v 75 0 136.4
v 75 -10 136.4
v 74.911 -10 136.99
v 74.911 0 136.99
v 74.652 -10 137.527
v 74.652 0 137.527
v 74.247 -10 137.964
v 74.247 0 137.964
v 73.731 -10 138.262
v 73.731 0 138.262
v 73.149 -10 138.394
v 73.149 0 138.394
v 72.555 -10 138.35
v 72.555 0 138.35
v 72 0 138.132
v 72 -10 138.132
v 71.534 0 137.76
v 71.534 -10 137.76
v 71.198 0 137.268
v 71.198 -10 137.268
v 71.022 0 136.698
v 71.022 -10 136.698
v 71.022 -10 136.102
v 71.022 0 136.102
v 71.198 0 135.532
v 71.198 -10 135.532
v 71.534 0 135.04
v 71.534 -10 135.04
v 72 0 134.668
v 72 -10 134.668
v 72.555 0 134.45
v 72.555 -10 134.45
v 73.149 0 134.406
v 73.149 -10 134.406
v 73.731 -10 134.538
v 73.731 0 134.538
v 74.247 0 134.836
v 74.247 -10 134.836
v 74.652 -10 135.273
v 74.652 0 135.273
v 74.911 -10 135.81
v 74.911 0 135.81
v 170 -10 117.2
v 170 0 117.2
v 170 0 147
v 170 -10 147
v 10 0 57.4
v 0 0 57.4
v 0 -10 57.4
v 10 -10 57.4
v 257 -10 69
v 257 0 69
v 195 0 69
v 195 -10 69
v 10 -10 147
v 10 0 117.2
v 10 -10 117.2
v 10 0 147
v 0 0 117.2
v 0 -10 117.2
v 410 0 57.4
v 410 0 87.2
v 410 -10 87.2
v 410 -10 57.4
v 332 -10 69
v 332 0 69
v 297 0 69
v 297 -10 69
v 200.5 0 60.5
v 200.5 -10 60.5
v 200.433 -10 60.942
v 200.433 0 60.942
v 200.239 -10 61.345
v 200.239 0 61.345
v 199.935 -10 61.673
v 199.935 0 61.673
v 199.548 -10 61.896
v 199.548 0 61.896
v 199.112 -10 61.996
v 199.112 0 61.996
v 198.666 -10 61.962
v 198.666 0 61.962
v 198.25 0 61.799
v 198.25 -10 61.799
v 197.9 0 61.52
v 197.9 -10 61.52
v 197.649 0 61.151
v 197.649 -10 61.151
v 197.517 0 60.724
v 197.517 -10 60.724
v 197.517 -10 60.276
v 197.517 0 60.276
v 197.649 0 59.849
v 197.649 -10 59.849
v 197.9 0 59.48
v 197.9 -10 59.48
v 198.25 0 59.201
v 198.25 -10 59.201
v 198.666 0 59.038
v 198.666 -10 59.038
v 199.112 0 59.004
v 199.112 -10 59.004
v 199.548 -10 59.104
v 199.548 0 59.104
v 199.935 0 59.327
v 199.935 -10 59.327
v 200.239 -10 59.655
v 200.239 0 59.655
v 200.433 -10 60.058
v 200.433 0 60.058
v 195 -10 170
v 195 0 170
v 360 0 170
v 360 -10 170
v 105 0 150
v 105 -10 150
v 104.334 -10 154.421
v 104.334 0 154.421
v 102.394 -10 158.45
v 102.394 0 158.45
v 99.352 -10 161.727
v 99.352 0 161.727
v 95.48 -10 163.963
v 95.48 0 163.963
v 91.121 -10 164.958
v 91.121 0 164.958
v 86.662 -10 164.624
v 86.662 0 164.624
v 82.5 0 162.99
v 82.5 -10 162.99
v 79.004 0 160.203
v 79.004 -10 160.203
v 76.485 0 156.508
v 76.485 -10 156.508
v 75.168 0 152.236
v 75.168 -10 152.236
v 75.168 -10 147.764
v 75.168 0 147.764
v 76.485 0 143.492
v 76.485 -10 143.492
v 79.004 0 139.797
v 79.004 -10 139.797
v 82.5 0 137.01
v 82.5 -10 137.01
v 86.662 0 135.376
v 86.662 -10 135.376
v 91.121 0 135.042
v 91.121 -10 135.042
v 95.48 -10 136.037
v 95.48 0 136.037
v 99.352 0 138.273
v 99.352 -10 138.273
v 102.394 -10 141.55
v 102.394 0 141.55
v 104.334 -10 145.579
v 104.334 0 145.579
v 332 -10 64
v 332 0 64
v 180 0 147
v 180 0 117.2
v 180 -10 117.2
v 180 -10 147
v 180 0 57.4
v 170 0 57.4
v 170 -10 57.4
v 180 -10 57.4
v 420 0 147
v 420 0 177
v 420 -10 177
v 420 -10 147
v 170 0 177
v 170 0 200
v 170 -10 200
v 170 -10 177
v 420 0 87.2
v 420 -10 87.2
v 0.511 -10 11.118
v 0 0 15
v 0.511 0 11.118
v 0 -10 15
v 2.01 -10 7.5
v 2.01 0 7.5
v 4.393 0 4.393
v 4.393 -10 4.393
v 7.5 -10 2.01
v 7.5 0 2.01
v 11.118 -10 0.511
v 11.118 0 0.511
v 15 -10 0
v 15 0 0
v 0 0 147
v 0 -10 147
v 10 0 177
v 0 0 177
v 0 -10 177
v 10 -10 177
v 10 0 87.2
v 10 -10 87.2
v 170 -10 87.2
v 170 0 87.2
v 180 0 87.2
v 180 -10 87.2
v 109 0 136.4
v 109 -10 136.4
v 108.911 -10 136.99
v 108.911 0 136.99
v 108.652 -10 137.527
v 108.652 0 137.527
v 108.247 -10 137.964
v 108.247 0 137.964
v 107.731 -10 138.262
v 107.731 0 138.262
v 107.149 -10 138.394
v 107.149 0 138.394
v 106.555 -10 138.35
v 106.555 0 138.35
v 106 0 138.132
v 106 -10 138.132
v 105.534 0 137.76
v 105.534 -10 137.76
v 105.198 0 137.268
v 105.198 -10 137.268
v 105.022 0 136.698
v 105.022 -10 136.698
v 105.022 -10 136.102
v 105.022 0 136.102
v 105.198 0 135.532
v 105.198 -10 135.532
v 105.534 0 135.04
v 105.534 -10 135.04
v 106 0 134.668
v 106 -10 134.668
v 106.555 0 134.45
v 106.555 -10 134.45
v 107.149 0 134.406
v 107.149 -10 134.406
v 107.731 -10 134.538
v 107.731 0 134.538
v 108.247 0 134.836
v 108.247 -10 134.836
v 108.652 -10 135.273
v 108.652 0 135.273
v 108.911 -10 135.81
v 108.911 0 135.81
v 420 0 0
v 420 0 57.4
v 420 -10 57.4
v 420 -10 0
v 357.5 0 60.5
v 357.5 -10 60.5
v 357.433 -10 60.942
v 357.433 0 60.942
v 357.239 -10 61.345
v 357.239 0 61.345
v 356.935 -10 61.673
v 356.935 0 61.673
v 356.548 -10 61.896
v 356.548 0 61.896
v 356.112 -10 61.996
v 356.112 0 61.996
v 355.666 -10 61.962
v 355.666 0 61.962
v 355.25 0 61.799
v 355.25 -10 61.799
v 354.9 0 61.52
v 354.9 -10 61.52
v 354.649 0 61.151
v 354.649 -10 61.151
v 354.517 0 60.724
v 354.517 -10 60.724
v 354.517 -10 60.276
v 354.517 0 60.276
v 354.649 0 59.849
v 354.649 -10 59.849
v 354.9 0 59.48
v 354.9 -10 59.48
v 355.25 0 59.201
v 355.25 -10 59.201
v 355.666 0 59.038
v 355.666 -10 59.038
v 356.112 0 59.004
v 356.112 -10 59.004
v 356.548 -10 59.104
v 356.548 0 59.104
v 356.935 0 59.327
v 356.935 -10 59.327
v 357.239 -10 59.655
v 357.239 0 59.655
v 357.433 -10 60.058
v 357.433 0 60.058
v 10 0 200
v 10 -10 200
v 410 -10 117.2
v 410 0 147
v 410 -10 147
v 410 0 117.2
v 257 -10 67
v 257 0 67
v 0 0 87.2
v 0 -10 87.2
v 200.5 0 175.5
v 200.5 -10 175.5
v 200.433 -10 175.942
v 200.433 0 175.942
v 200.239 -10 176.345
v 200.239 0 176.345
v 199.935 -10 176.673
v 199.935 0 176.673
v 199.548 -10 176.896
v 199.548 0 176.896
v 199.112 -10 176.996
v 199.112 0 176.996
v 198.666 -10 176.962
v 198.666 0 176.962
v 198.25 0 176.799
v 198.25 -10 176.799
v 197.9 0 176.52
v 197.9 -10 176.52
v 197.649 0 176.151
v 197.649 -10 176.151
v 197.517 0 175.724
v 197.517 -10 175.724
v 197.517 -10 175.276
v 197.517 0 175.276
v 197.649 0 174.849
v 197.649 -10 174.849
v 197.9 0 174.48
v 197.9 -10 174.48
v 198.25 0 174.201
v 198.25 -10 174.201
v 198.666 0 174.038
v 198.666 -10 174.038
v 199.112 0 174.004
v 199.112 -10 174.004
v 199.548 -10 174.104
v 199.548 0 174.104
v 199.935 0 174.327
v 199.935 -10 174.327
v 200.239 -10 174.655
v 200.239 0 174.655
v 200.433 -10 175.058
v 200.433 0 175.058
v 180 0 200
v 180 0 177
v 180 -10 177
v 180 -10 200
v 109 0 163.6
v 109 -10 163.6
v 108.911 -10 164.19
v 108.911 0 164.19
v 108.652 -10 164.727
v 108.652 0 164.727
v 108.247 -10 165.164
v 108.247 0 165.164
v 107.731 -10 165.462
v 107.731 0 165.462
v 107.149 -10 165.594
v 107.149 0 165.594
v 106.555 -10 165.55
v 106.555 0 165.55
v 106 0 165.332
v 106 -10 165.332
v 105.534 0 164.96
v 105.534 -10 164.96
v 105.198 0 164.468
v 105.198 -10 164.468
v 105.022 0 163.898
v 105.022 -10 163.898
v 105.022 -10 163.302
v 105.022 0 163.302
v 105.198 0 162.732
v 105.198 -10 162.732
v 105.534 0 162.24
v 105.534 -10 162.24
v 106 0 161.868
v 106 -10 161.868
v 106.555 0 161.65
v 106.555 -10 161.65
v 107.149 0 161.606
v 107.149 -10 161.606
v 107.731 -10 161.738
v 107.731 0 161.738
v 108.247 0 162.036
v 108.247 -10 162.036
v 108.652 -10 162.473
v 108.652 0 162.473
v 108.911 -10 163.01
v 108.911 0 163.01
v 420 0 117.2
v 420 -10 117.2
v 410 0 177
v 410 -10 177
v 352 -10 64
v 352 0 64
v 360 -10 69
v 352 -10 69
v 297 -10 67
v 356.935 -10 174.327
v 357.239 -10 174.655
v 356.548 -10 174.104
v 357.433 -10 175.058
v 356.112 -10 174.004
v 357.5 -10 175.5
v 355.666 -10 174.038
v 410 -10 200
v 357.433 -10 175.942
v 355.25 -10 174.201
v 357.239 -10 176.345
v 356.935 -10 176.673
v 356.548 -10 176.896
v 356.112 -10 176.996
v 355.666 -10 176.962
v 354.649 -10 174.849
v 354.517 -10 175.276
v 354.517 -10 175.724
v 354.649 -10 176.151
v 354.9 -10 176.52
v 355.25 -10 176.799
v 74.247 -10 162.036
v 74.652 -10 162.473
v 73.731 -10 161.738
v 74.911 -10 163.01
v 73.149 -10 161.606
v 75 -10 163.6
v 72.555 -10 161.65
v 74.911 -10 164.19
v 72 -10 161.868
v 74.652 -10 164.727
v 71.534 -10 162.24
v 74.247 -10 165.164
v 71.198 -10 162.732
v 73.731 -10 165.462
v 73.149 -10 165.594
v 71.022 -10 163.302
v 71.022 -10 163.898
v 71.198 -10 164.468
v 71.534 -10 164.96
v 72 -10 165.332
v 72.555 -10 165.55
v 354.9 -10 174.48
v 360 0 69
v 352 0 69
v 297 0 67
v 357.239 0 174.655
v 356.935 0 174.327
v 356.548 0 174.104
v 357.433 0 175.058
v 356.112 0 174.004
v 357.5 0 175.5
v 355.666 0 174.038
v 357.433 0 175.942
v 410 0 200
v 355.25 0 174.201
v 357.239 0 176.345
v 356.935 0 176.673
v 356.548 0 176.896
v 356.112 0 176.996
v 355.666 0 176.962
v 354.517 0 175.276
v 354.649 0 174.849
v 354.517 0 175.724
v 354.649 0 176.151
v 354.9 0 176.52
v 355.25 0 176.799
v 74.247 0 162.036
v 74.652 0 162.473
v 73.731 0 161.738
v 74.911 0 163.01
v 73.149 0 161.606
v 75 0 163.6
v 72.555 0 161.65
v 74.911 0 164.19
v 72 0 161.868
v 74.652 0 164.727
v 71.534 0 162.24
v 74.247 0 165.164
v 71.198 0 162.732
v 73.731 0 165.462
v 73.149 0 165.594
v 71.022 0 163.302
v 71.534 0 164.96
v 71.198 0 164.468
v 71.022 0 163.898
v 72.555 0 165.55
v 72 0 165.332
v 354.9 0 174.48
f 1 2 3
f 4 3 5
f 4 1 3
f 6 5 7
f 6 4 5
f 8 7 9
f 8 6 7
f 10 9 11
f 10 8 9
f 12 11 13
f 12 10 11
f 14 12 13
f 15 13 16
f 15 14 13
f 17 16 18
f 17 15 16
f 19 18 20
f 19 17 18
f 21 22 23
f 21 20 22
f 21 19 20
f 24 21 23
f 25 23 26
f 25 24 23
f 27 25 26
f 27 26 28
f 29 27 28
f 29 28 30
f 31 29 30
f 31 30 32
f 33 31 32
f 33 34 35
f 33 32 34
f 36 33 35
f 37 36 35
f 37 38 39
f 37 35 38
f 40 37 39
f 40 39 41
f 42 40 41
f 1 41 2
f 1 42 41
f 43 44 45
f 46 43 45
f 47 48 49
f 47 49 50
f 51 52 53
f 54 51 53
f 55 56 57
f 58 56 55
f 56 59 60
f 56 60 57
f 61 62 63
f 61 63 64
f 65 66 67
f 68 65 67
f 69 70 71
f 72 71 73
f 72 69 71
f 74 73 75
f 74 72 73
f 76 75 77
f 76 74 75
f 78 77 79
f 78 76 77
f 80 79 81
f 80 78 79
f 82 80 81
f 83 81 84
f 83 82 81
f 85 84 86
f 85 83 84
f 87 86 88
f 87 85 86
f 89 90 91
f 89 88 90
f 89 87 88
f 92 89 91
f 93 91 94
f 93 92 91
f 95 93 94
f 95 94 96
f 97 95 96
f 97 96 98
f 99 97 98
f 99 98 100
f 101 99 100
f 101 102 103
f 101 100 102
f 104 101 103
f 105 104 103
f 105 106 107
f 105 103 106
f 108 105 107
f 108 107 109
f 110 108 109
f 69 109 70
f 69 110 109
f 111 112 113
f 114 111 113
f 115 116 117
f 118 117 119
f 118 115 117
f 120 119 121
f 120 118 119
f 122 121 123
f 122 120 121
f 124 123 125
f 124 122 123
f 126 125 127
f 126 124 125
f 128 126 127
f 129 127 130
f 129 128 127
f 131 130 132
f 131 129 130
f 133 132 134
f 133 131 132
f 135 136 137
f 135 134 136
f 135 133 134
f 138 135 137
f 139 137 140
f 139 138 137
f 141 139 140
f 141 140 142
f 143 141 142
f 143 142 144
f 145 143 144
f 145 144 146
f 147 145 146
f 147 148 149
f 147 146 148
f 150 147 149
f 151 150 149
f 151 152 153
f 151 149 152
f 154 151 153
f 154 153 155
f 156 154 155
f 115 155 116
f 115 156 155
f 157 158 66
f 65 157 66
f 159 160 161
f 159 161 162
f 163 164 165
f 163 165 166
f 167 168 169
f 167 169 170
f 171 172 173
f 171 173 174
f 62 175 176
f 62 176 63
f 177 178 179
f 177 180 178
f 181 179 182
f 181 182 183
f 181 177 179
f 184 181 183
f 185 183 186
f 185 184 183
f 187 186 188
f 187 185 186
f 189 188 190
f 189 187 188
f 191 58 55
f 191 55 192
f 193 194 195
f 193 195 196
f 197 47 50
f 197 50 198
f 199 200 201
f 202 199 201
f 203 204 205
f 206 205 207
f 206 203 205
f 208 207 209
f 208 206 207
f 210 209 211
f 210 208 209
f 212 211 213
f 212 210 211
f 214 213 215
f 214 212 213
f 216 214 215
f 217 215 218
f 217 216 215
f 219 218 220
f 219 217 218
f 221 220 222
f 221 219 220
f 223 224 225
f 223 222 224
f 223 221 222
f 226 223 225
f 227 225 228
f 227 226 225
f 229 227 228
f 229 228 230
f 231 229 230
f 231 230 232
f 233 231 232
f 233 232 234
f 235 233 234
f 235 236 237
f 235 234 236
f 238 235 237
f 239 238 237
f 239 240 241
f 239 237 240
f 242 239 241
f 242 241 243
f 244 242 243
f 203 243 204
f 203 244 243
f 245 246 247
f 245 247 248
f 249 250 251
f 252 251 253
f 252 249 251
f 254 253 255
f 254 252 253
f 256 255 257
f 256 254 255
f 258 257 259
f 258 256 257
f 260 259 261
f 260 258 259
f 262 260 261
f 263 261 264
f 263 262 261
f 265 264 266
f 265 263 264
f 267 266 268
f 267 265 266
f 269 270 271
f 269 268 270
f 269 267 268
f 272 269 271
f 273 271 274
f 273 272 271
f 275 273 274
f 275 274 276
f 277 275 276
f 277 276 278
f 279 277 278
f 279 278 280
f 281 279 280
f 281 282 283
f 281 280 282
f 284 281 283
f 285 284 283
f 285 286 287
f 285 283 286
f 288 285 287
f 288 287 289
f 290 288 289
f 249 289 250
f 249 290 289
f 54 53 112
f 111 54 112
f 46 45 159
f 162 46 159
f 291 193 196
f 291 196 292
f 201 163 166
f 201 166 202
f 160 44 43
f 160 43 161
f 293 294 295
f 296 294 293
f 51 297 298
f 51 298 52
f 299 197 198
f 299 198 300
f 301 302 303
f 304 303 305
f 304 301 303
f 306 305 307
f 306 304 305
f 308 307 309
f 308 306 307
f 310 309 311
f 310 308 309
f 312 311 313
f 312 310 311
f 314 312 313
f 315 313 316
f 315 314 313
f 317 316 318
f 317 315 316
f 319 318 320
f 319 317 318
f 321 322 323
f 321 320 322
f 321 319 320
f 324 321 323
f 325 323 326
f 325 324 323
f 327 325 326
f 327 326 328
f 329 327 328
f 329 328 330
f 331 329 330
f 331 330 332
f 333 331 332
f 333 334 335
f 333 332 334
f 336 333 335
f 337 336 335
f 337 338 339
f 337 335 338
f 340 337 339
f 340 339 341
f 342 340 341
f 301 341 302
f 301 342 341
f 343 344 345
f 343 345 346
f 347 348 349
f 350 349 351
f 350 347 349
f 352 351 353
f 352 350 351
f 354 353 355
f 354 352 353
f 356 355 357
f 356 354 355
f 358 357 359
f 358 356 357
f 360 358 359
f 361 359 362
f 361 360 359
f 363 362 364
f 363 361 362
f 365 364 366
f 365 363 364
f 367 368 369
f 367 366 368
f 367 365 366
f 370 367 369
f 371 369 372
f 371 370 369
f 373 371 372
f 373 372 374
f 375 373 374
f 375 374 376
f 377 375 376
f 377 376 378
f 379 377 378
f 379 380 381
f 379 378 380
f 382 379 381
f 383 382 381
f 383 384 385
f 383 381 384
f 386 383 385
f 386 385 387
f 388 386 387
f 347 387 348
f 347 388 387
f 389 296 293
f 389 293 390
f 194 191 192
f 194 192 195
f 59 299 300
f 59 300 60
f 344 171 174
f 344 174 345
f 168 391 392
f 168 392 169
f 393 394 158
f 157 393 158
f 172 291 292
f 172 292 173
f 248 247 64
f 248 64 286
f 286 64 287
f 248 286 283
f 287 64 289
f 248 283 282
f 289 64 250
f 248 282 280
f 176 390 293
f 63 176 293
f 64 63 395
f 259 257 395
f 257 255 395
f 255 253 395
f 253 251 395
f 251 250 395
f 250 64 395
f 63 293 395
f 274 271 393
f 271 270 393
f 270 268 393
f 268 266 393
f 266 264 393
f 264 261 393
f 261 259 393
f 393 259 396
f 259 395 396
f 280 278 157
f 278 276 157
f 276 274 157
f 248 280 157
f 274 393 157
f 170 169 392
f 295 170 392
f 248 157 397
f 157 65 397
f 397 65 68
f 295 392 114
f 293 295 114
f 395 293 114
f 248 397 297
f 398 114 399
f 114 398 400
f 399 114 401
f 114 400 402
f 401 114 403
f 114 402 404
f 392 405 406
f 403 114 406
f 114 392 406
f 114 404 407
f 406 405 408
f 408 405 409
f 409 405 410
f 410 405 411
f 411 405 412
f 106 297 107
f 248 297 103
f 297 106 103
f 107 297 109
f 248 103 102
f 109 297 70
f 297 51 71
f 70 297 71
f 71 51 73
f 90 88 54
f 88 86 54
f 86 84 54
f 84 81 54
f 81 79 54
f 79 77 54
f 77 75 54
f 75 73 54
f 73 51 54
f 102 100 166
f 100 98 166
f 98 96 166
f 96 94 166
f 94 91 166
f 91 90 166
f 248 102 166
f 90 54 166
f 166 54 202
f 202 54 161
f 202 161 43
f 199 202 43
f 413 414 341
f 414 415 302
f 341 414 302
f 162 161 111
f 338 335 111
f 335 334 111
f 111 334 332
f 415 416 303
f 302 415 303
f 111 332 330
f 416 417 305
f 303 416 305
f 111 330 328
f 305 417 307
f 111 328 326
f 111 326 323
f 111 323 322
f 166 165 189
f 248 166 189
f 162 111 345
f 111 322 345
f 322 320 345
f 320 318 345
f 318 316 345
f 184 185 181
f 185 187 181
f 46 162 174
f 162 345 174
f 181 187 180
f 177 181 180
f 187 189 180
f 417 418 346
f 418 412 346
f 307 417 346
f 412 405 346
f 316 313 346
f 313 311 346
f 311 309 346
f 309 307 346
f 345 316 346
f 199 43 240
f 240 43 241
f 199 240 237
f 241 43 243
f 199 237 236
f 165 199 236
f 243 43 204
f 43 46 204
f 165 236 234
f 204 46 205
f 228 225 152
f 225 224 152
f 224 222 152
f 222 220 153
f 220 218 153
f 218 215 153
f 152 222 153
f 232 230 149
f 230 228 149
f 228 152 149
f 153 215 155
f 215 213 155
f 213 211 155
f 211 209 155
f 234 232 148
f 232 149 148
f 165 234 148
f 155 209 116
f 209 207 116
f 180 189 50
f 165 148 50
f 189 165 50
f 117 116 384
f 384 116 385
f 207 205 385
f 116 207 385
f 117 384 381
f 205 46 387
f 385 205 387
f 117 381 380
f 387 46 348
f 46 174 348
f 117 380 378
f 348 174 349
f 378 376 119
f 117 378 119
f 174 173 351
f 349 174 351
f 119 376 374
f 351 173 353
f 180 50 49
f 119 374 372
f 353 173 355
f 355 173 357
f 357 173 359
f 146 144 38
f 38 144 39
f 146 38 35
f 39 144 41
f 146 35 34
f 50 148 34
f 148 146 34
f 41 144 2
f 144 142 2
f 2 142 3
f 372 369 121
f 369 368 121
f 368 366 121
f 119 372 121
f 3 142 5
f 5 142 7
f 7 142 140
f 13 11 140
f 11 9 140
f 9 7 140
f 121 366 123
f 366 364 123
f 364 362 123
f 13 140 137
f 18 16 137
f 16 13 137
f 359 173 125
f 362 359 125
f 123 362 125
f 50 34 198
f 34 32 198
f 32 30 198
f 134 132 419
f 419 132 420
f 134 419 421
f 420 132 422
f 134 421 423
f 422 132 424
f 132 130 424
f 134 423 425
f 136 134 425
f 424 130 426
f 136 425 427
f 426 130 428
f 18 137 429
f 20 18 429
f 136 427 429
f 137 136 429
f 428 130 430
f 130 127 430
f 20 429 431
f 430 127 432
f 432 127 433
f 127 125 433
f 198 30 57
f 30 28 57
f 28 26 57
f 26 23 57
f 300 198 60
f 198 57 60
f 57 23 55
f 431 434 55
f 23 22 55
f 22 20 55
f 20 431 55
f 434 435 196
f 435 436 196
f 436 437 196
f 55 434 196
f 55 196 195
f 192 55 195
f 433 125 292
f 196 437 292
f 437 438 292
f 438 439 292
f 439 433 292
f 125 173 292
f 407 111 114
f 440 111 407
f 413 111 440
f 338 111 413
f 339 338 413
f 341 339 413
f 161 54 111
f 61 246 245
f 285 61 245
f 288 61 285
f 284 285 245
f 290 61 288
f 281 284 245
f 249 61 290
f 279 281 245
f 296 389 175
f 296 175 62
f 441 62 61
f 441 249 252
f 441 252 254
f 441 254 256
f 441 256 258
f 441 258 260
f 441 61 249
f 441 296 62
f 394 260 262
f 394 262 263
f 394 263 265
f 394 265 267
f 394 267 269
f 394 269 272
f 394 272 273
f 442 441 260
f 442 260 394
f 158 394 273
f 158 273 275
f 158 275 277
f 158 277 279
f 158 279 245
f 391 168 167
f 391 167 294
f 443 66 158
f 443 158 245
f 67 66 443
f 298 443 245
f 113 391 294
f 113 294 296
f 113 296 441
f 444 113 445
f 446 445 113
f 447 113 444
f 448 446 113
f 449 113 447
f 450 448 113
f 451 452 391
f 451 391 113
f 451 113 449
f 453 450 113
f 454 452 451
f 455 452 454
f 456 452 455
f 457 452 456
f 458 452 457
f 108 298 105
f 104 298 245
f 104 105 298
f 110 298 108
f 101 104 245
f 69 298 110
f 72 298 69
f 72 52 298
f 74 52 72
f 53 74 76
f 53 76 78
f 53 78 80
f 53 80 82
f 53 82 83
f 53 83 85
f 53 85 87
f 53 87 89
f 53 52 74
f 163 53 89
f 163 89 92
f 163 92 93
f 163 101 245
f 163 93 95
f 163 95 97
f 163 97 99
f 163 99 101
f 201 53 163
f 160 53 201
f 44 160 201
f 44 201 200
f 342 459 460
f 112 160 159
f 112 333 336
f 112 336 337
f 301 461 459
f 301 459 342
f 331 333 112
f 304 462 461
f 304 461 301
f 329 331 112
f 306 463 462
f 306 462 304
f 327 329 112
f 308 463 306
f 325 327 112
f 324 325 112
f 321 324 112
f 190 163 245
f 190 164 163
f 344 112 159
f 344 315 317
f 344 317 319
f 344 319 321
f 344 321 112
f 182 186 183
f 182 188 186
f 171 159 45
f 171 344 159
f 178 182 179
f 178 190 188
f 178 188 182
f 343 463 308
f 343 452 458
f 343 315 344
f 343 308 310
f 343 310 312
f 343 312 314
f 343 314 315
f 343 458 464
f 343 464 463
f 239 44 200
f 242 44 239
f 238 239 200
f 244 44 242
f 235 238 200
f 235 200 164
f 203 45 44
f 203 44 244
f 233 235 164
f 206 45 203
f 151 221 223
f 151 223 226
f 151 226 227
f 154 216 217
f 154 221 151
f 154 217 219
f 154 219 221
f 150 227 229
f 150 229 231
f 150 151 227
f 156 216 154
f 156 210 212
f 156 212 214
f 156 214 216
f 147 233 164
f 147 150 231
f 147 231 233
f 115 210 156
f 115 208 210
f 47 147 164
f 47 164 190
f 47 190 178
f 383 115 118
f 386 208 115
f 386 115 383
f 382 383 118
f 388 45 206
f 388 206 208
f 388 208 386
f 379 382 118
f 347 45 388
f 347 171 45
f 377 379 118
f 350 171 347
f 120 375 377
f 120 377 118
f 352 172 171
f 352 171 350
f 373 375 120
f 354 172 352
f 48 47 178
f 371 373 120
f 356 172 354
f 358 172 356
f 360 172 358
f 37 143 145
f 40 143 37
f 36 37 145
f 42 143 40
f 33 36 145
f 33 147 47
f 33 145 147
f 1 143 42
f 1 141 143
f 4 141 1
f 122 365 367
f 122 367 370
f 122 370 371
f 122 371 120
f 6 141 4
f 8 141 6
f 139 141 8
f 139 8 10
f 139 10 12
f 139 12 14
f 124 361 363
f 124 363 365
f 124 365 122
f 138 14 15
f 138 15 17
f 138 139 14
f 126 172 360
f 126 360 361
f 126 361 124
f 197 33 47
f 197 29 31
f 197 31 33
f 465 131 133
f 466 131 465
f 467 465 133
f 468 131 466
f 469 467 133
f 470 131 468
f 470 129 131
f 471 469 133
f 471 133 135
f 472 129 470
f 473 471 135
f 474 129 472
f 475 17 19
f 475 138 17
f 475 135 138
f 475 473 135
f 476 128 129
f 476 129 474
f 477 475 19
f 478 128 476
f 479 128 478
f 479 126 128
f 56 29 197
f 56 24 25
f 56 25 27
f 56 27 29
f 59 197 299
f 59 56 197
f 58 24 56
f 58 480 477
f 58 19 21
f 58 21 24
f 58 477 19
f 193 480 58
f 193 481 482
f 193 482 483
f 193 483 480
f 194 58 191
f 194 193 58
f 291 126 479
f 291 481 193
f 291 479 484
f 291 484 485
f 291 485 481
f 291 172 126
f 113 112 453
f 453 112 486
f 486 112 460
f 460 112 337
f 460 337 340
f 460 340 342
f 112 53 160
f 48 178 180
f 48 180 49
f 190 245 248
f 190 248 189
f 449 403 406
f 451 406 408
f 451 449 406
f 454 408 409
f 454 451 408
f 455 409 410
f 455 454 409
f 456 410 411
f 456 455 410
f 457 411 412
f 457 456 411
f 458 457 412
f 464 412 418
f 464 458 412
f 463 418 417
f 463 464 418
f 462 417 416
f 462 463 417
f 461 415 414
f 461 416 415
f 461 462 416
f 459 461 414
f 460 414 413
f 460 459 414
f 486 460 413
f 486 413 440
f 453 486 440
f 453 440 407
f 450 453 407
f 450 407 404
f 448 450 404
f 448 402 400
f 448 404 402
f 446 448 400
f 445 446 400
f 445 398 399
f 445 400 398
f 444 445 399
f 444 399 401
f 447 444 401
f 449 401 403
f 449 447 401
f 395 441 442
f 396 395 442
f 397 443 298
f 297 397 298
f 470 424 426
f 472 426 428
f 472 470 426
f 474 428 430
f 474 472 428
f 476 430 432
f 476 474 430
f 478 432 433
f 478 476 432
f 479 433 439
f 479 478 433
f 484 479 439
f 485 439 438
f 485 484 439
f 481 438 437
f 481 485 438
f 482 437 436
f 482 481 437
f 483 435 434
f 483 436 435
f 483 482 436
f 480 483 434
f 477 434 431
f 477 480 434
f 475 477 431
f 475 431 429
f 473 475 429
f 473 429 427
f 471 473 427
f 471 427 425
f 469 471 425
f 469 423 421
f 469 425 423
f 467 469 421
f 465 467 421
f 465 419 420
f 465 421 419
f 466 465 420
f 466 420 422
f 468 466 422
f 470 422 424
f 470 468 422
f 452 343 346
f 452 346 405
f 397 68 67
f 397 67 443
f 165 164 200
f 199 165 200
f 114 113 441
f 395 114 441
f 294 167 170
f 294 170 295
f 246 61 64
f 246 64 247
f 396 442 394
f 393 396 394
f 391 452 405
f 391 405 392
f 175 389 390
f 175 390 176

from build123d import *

# Parameters (mm, degrees)
SKETCH_W          = 10
SKETCH_H          = 29.8
PAD_DEPTH         = 10
COPYSKETCH001_R   = 2
COPYSKETCH001_R_2 = 15
POCKET_DEPTH      = 10.001
FILLET_R          = 15
SKETCH001_R       = 1.5
POCKET001_DEPTH   = 10.001


with BuildPart() as part:
    # Sketch → Pad (new body)
    with BuildSketch(Plane.XZ):
        Polygon((0, 0), (0, 57.4), (10, 57.4), (10, 87.2), (0, 87.2), (0, 117.2), (10, 117.2), (10, 147), (0, 147), (0, 177), (10, 177), (10, 200), (170, 200), (170, 177), (180, 177), (180, 200), (410, 200), (410, 177), (420, 177), (420, 147), (410, 147), (410, 117.2), (420, 117.2), (420, 87.2), (410, 87.2), (410, 57.4), (420, 57.4), (420, 0), align=None)
        with Locations((175, 132.1)):
            Rectangle(SKETCH_W, SKETCH_H, mode=Mode.SUBTRACT)
        with Locations((175, 72.3)):
            Rectangle(SKETCH_W, SKETCH_H, mode=Mode.SUBTRACT)
    extrude(amount=PAD_DEPTH)

    # CopySketch001 → Pocket (cut, through all)
    with BuildSketch(Plane.XZ):
        with Locations((73, 163.6)):
            Circle(COPYSKETCH001_R)
        with Locations((107, 163.6)):
            Circle(COPYSKETCH001_R)
        with Locations((107, 136.4)):
            Circle(COPYSKETCH001_R)
        with Locations((73, 136.4)):
            Circle(COPYSKETCH001_R)
        with Locations((90, 150)):
            Circle(COPYSKETCH001_R_2)
    extrude(amount=POCKET_DEPTH, mode=Mode.SUBTRACT)

    # Fillet
    fillet_edges = [part.edges().sort_by_distance(p)[0] for p in [
        (0, -5, 0),
    ]]
    fillet(fillet_edges, radius=FILLET_R)

    # Sketch001 → Pocket001 (cut, through all)
    with BuildSketch(Plane.XZ):
        with Locations((199, 175.5)):
            Circle(SKETCH001_R)
        with Locations((356, 175.5)):
            Circle(SKETCH001_R)
        with Locations((356, 60.5)):
            Circle(SKETCH001_R)
        with Locations((199, 60.5)):
            Circle(SKETCH001_R)
        Polygon((195, 170), (360, 170), (360, 69), (352, 69), (352, 64), (332, 64), (332, 69), (297, 69), (297, 67), (257, 67), (257, 69), (195, 69), align=None)
    extrude(amount=POCKET001_DEPTH, mode=Mode.SUBTRACT)


solid = part.part
